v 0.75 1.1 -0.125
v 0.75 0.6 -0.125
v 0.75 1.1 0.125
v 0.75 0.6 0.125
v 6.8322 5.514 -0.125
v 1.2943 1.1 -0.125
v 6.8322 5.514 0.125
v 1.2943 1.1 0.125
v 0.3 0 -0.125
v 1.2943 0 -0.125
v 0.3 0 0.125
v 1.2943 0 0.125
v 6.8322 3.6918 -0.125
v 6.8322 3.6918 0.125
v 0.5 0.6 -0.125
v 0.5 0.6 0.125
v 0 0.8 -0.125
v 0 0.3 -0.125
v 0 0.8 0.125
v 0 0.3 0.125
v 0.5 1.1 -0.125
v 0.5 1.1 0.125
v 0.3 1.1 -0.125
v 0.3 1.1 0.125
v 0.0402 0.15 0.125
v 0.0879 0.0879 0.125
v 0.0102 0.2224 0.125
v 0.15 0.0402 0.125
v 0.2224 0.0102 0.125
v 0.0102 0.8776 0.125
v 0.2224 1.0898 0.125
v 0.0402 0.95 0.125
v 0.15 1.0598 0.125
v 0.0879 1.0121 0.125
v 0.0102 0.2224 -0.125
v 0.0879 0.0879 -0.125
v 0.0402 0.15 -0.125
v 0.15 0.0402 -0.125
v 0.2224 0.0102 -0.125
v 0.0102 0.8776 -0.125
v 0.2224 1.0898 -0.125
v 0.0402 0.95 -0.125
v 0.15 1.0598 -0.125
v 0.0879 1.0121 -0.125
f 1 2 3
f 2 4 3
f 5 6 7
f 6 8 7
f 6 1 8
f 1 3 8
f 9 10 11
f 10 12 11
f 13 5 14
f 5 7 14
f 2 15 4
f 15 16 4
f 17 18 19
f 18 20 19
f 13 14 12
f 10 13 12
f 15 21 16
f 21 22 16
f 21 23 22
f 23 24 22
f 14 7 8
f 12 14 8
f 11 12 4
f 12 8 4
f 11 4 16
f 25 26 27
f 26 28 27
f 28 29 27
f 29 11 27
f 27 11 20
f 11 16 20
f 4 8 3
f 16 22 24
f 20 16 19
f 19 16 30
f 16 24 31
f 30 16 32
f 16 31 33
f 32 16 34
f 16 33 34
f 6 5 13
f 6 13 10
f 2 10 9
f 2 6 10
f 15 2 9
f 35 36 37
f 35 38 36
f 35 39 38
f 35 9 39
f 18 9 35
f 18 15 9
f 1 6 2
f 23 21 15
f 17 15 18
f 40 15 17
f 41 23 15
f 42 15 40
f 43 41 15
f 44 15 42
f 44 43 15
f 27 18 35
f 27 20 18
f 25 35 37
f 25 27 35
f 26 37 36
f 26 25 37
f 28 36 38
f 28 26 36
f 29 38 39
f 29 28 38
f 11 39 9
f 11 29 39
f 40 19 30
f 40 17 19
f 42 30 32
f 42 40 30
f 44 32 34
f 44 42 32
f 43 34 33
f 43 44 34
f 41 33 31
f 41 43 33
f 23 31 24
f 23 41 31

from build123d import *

# Parameters (mm, degrees)
BOSS_EXTRUDE1_DEPTH = 0.125
FILLET1_R           = 0.3


with BuildPart() as part:
    # frame_outline → Boss-Extrude1 (new, symmetric)
    with BuildSketch(Plane.XY):
        Polygon((0, 0), (0, 1.1), (0.5, 1.1), (0.5, 0.6), (0.75, 0.6), (0.75, 1.1), (1.294312935, 1.1), (6.832215904, 5.513992793), (6.832215904, 3.691761529), (1.294312935, 0), align=None)
    extrude(amount=BOSS_EXTRUDE1_DEPTH, both=True)

    # Fillet1
    fillet1_edges = [part.edges().sort_by_distance(p)[0] for p in [
        (0, 0, 0),
        (0, 1.1, 0),
    ]]
    fillet(fillet1_edges, radius=FILLET1_R)


solid = part.part
